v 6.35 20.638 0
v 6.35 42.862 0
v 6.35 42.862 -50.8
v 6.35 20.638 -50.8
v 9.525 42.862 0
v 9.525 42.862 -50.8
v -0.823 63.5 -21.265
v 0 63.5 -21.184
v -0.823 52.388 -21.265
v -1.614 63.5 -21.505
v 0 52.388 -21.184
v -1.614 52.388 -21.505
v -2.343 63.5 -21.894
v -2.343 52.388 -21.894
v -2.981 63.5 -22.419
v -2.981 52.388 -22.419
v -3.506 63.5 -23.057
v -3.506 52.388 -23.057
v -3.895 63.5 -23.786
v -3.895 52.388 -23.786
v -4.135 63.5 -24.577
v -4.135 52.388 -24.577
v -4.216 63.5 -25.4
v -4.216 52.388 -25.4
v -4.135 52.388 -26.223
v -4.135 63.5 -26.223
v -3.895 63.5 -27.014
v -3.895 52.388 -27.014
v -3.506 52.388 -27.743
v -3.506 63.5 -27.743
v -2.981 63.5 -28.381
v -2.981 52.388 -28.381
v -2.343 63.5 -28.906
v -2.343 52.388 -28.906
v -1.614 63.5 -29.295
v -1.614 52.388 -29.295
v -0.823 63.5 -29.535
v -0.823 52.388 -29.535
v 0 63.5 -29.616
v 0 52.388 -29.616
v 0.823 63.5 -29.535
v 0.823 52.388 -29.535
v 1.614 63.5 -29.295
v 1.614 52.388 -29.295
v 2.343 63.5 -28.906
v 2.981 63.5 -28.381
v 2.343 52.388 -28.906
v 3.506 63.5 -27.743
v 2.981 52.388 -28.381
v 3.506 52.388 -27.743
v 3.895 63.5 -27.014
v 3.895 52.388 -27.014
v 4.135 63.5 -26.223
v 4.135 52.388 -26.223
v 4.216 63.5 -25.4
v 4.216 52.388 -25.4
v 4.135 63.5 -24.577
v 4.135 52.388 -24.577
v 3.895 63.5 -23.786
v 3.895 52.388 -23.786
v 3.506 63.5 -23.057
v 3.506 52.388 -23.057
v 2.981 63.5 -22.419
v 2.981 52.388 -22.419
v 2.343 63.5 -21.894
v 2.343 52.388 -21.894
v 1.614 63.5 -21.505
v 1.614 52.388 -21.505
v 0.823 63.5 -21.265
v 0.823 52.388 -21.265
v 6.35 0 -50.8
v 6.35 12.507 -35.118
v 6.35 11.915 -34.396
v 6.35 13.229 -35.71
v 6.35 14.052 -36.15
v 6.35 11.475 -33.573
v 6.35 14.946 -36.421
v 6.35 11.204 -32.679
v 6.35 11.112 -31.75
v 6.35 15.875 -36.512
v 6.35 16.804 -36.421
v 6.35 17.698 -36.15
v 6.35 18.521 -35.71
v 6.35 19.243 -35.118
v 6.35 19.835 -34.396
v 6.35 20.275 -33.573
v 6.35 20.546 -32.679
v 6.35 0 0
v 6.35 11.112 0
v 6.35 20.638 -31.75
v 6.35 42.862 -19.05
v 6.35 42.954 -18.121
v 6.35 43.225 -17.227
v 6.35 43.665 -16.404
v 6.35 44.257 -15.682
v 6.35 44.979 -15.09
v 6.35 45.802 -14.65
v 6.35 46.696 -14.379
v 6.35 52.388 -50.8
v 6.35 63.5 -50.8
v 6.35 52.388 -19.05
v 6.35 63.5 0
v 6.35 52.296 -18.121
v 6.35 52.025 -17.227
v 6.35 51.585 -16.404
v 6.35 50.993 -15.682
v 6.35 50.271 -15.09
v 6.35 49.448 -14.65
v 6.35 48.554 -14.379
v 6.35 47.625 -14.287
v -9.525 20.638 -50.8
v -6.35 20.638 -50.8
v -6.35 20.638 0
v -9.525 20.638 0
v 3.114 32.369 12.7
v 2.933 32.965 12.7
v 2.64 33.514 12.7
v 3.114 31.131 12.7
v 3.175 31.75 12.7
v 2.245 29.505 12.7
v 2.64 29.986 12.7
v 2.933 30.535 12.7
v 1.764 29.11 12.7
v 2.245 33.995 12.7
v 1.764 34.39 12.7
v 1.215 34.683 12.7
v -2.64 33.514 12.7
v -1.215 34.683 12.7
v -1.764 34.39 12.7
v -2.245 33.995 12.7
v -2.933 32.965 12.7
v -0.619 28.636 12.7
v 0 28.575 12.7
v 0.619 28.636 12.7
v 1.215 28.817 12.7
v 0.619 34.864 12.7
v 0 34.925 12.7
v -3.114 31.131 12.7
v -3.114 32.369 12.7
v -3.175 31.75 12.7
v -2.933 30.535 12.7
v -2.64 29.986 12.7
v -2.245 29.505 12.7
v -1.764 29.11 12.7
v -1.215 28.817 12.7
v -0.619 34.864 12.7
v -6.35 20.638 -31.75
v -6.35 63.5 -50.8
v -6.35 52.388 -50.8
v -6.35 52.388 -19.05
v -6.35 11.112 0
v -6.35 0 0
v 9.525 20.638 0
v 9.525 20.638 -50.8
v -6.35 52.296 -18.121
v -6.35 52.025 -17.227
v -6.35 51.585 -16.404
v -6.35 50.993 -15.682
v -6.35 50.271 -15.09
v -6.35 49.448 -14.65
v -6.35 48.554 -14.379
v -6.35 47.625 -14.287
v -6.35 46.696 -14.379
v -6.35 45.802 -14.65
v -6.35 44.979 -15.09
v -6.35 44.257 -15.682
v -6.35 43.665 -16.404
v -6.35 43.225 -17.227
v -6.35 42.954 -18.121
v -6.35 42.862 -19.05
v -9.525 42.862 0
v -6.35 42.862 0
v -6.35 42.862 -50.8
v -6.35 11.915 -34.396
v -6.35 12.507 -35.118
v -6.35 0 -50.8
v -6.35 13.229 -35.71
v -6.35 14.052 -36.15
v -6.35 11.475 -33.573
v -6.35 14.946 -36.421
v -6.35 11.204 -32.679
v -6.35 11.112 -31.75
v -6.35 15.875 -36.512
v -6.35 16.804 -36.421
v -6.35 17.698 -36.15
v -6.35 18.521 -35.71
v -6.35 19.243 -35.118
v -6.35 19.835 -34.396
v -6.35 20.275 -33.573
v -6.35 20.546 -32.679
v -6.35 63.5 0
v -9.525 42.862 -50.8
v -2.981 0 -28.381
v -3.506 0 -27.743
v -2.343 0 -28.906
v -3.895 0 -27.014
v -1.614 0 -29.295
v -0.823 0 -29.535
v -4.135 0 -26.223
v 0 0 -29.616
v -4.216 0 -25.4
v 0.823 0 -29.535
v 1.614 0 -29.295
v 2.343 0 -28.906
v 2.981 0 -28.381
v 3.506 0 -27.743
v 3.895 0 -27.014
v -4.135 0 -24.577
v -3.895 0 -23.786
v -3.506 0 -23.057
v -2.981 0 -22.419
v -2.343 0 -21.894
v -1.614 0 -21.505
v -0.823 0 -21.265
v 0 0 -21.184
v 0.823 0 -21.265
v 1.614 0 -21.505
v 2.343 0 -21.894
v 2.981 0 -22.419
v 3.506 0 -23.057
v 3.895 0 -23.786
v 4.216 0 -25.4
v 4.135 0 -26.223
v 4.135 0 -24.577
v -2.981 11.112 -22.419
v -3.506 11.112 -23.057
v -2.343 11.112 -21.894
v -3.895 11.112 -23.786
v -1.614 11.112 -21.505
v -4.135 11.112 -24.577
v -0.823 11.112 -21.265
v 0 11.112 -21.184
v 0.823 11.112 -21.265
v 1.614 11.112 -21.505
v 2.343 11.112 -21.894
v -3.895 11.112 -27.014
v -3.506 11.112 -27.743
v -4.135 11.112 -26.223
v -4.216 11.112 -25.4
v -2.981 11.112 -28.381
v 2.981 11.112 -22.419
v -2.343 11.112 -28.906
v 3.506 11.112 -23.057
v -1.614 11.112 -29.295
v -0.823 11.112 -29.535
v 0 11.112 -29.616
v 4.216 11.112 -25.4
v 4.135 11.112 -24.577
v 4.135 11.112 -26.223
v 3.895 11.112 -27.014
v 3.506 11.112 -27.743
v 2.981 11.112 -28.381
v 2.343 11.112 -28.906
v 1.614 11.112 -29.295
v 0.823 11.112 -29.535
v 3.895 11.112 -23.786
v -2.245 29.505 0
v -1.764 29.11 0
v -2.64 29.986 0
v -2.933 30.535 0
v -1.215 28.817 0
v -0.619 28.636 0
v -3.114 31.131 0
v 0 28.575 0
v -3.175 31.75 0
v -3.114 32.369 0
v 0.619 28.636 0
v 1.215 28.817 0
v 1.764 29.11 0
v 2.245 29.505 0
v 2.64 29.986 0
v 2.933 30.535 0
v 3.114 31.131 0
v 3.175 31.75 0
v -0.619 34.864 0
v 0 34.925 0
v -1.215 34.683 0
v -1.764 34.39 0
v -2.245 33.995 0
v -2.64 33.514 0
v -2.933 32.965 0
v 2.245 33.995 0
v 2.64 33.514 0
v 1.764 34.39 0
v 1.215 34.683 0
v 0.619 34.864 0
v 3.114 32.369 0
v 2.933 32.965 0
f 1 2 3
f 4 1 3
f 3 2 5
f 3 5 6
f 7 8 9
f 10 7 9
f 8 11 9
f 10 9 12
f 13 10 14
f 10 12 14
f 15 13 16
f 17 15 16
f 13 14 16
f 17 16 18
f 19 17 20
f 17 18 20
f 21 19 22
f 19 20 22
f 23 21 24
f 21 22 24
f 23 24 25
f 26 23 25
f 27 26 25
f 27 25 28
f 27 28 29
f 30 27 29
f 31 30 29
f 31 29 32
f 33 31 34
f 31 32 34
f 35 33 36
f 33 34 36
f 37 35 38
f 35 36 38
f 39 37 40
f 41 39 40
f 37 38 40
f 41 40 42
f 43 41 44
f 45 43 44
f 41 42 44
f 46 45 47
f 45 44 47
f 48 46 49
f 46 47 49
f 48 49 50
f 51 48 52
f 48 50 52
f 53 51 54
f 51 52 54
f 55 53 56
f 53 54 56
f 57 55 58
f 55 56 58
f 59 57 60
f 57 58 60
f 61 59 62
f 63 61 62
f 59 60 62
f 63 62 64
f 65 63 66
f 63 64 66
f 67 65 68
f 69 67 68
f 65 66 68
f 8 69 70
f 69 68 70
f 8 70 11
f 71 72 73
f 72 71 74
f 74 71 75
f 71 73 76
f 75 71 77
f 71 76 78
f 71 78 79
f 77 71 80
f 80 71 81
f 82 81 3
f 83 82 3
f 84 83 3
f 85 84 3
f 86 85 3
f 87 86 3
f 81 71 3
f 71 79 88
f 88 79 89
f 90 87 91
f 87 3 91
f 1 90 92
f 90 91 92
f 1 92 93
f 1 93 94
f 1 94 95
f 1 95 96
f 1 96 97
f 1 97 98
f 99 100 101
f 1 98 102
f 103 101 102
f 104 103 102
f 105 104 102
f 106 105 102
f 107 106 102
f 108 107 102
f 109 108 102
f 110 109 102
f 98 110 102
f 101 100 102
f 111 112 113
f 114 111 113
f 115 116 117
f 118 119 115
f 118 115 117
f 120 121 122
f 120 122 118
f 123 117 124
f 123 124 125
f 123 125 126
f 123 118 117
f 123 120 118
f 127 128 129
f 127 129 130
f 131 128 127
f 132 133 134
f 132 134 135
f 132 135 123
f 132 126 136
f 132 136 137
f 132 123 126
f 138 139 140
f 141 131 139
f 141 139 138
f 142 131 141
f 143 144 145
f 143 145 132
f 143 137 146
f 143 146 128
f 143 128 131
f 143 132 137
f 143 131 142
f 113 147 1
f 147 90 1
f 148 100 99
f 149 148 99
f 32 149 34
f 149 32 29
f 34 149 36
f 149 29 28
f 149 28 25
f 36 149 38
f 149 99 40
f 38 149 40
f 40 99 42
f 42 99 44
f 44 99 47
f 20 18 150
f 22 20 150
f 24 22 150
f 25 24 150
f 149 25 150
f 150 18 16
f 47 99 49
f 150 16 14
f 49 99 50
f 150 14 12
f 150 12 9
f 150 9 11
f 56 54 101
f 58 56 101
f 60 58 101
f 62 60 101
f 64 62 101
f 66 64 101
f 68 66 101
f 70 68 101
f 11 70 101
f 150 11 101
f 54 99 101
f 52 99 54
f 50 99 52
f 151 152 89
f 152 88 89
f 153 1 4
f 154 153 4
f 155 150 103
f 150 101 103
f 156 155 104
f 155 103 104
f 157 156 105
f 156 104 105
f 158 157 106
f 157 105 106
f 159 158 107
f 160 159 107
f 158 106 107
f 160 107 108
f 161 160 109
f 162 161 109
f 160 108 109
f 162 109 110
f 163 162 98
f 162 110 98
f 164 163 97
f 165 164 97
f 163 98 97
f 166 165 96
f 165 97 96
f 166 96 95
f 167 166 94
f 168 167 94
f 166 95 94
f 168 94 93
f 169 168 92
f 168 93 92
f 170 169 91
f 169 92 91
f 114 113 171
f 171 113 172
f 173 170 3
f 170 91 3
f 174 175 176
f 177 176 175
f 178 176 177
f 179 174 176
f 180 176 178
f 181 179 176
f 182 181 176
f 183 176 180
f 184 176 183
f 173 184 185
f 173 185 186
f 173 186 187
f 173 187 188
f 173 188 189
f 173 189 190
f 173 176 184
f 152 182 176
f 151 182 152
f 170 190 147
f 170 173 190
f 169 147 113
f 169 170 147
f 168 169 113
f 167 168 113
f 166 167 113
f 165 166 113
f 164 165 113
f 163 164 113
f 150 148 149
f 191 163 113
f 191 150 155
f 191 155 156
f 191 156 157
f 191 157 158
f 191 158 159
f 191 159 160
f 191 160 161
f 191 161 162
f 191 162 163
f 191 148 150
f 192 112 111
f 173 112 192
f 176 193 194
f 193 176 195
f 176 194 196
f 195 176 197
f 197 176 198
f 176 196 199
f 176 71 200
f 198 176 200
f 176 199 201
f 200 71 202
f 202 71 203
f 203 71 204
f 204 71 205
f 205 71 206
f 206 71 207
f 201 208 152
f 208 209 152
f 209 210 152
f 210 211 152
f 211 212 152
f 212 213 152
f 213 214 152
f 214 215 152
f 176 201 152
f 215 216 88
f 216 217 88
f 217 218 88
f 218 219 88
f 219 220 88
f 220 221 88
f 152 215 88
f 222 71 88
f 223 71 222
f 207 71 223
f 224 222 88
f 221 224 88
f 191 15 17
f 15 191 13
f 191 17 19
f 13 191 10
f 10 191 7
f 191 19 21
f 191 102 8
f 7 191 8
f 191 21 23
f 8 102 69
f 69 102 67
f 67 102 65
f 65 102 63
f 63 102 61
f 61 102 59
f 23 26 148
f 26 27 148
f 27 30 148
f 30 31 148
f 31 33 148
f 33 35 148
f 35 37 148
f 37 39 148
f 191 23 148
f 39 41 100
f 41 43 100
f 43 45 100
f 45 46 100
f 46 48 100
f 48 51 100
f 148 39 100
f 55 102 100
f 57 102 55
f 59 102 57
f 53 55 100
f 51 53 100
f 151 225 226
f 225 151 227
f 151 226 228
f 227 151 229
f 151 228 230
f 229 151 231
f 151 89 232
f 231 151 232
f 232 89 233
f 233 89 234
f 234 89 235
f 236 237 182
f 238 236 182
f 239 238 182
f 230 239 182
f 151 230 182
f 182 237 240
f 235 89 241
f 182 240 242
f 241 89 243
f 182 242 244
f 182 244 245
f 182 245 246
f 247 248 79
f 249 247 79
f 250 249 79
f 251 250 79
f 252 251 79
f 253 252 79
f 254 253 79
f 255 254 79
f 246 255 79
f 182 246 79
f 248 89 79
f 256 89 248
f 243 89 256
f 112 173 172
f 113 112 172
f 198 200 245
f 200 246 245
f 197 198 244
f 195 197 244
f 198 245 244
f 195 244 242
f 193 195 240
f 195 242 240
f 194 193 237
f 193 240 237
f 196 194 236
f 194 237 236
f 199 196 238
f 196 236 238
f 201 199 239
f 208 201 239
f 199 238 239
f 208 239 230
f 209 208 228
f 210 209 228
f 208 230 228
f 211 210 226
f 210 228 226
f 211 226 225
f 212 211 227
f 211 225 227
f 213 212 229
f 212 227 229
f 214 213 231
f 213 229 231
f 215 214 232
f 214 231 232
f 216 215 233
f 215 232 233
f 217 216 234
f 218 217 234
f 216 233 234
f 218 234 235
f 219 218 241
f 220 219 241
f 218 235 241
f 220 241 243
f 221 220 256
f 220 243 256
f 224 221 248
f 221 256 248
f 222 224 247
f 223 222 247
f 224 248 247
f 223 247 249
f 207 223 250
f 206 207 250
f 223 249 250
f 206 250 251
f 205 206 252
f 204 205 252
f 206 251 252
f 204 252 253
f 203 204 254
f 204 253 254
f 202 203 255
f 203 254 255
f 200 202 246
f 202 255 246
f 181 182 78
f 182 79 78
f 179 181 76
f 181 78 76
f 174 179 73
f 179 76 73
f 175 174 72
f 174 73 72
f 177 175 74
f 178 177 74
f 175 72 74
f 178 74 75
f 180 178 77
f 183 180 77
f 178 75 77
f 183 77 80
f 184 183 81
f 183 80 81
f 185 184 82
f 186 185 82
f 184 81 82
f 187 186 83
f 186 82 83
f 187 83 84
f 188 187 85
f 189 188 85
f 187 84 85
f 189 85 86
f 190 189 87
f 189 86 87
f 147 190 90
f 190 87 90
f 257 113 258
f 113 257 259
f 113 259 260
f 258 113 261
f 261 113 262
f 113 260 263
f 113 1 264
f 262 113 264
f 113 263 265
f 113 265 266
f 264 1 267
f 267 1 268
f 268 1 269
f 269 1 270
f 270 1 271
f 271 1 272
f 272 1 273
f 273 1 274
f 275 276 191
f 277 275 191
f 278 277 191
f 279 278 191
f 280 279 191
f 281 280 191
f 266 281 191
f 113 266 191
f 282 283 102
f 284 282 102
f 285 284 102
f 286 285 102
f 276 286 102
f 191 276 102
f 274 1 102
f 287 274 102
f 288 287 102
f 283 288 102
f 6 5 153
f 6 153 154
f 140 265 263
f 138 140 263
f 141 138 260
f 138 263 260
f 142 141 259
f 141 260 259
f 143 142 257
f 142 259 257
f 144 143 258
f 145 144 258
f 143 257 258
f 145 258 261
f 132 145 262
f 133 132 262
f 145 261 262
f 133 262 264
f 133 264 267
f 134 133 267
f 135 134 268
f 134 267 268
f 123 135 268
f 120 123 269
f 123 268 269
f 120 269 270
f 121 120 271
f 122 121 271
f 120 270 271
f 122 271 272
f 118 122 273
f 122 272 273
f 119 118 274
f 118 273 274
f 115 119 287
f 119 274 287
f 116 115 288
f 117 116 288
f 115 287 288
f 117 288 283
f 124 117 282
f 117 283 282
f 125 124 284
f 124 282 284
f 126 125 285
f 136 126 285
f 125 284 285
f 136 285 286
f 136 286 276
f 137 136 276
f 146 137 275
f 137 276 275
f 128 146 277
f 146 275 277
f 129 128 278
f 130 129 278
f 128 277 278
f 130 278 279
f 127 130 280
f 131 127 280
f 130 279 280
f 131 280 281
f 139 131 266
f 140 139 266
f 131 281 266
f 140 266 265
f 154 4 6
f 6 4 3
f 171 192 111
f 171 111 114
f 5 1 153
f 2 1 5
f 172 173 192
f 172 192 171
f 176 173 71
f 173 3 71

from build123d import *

# Parameters (mm, degrees)
EXTRUDE1_DEPTH = 6.35
SKETCH2_W      = 50.8
SKETCH2_H      = 22.225
EXTRUDE2_DEPTH = 3.175
SKETCH3_W      = 50.8
SKETCH3_H      = 22.225
EXTRUDE3_DEPTH = 3.175
SKETCH4_W      = 4.2164
SKETCH4_H      = 11.1125
SKETCH8_W      = 4.2164
SKETCH8_H      = 11.1125
SKETCH10_R     = 3.175
EXTRUDE4_DEPTH = 12.7


with BuildPart() as part:
    # Sketch1 → Extrude1 (new, symmetric)
    with BuildSketch(Plane(origin=(0, 0, 0), x_dir=(0, 0, -1), z_dir=(1, 0, 0))):
        with BuildLine():
            Line((50.8, 52.3875), (19.05, 52.3875))
            ThreePointArc((19.05, 52.3875), (14.2875, 47.625), (19.05, 42.8625))
            Line((19.05, 42.8625), (50.8, 42.8625))
            Line((50.8, 42.8625), (50.8, 0))
            Line((50.8, 0), (0, 0))
            Line((0, 0), (0, 11.1125))
            Line((0, 11.1125), (31.75, 11.1125))
            ThreePointArc((31.75, 11.1125), (36.5125, 15.875), (31.75, 20.6375))
            Line((31.75, 20.6375), (0, 20.6375))
            Line((0, 20.6375), (0, 63.5))
            Line((0, 63.5), (50.8, 63.5))
            Line((50.8, 63.5), (50.8, 52.3875))
        make_face()
    extrude(amount=EXTRUDE1_DEPTH, both=True)

    # Sketch4 → 3/8-24 Tapped Hole1 (revolve, cut)
    with BuildSketch(Plane(origin=(0, 63.5, -25.4), x_dir=(0, 0, 1), z_dir=(1, 0, 0))):
        with Locations((2.1082, 5.55625)):
            Rectangle(SKETCH4_W, SKETCH4_H)
    revolve(axis=Axis((0, 69.85, -25.4), (0, -1, 0)), mode=Mode.SUBTRACT)

    # Sketch8 → 3/8-24 Tapped Hole2 (revolve, cut)
    with BuildSketch(Plane(origin=(0, 0, -25.4), x_dir=(0, 0, -1), z_dir=(1, 0, 0))):
        with Locations((2.1082, 5.55625)):
            Rectangle(SKETCH8_W, SKETCH8_H)
    revolve(axis=Axis((0, -6.35, -25.4), (0, 1, 0)), mode=Mode.SUBTRACT)

    # Sketch10 → Extrude4 (add)
    with BuildSketch(Plane.XY):
        with Locations(Location((0, 31.75, 0), (0, 0, 180))):
            Circle(SKETCH10_R)
    extrude(amount=EXTRUDE4_DEPTH)


with BuildPart() as body_2:
    # Sketch2 → Extrude2 (new body)
    with BuildSketch(Plane(origin=(6.35, 0, 0), x_dir=(0, 0, -1), z_dir=(1, 0, 0))):
        with Locations((25.4, 31.75)):
            Rectangle(SKETCH2_W, SKETCH2_H)
    extrude(amount=EXTRUDE2_DEPTH)


with BuildPart() as body_3:
    # Sketch3 → Extrude3 (new body)
    with BuildSketch(Plane.ZY.offset(6.35)):
        with Locations((-25.4, 31.75)):
            Rectangle(SKETCH3_W, SKETCH3_H)
    extrude(amount=EXTRUDE3_DEPTH)


solid = Compound([part.part, body_2.part, body_3.part])
